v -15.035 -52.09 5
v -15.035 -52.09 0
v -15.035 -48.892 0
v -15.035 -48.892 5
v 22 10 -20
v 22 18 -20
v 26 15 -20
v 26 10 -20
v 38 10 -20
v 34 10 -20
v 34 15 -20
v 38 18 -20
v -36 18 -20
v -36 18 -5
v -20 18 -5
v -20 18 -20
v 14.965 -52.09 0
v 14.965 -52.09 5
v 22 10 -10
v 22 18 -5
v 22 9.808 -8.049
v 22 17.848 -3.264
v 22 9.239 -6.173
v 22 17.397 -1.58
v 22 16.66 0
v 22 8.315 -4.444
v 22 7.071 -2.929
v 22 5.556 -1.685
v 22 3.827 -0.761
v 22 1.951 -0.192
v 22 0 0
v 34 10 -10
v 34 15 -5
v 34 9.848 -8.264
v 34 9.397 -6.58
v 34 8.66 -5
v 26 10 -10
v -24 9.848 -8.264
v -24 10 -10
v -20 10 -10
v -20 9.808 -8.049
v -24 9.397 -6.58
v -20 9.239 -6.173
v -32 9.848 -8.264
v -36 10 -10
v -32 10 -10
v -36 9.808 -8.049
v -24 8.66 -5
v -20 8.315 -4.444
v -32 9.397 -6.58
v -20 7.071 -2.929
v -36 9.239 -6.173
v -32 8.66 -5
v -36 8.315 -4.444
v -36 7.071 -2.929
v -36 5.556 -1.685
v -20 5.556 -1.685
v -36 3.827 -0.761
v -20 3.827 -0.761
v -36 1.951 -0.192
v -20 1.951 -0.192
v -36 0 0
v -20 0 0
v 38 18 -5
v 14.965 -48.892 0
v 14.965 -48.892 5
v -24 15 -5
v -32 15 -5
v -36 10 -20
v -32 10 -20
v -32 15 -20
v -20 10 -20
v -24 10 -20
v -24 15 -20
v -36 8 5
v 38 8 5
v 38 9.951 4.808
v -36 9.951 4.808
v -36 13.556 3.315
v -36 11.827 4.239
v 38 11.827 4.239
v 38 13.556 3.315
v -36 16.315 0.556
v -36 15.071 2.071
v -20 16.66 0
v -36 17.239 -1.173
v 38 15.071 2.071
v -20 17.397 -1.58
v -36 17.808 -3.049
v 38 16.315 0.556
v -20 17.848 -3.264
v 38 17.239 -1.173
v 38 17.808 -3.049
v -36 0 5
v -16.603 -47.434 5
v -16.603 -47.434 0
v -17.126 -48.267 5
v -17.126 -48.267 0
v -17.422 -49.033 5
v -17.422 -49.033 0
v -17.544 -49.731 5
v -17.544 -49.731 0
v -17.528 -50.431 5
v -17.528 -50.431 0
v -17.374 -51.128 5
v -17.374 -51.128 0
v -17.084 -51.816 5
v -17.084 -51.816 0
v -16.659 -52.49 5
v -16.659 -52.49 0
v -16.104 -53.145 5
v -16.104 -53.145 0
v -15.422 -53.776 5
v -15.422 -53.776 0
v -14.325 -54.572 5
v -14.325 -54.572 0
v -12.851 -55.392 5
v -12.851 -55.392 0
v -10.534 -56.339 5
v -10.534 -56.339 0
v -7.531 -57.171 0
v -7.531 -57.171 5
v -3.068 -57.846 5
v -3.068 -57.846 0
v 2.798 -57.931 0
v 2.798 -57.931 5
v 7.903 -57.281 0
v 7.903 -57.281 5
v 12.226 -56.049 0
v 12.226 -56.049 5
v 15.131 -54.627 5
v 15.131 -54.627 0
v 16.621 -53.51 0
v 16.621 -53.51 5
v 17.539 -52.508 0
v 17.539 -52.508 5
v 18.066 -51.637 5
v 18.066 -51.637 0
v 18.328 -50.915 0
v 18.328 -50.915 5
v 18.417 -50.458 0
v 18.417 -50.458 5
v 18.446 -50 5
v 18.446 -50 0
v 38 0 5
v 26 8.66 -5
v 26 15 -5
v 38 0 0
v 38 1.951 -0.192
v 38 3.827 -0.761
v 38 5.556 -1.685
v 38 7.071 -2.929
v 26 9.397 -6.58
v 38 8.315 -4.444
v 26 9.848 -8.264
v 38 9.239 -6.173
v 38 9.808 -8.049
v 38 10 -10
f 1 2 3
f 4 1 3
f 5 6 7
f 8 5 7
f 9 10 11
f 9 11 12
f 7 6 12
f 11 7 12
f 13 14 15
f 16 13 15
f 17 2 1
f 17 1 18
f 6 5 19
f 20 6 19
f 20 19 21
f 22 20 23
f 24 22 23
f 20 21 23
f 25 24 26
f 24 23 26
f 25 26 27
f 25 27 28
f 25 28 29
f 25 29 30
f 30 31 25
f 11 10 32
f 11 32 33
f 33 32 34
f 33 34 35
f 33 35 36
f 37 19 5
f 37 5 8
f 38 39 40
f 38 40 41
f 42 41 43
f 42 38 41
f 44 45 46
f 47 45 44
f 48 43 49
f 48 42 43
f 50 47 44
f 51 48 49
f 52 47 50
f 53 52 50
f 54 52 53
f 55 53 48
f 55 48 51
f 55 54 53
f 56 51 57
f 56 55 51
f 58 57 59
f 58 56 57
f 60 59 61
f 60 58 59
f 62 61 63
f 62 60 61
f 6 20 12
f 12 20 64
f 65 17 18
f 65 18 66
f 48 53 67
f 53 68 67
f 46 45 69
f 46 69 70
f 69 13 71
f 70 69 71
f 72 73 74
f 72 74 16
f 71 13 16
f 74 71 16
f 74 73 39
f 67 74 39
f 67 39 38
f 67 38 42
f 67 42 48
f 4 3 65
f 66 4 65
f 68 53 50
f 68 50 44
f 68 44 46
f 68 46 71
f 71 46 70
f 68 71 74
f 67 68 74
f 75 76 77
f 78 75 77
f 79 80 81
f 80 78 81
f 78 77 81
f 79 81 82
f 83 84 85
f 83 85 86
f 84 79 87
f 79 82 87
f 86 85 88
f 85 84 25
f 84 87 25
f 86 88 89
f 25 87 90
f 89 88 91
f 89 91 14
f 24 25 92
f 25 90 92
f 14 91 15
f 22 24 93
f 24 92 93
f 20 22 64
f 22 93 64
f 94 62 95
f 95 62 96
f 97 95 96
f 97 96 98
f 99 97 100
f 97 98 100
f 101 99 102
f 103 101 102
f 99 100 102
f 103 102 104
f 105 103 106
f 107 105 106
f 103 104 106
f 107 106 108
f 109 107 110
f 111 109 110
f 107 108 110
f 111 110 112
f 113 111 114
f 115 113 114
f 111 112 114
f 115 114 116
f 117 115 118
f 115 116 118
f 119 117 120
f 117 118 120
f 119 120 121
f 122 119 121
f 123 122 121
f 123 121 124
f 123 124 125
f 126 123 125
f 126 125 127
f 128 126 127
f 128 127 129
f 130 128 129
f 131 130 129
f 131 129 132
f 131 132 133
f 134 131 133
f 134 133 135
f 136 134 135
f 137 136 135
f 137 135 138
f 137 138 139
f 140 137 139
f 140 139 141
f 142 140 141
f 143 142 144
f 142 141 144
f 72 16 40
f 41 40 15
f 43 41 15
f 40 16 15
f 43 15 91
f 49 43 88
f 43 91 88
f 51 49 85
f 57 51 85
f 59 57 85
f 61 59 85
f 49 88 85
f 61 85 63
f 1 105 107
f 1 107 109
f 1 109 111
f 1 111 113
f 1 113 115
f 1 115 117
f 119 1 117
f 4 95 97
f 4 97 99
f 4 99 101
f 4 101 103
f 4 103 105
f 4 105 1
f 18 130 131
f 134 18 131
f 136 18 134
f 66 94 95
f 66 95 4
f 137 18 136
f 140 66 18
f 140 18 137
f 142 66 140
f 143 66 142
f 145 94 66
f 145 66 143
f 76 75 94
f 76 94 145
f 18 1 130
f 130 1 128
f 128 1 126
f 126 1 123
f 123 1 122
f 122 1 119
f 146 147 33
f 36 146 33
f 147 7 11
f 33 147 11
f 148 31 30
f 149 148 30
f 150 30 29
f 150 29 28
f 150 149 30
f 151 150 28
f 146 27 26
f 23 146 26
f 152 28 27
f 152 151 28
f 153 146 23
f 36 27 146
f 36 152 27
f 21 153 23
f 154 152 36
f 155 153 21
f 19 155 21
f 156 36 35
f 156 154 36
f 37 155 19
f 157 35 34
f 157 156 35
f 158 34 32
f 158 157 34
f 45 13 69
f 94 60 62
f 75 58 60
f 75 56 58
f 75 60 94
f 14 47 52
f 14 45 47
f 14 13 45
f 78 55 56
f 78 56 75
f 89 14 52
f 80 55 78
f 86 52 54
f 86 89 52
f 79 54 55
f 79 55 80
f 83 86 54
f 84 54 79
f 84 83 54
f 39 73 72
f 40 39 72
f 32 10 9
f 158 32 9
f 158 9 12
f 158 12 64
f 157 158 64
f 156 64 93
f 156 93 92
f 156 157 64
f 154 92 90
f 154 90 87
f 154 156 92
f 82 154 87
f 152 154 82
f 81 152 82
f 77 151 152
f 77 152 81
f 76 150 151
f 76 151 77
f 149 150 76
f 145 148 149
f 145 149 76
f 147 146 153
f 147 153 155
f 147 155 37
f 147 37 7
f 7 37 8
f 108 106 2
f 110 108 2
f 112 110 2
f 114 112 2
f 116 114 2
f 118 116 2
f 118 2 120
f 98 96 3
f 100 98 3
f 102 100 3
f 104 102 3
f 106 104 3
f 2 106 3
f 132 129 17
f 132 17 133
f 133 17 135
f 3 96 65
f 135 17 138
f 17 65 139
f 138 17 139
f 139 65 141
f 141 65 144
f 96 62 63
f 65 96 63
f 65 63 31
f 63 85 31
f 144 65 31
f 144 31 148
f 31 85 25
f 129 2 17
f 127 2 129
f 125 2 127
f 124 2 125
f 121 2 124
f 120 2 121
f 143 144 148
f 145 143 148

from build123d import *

# Parameters (mm, degrees)
PLATE_FEATURE_DEPTH        = 5
STRAP_FEATURE_SKETCH_RX    = 18
STRAP_FEATURE_SKETCH_RY    = 8
STRAP_FEATURE_DEPTH        = 5
STRAP_CUT_SKETCH_W         = 30
STRAP_CUT_SKETCH_H         = 3.19824666
STRAP_CUT_DEPTH            = 5
LEFT_LEG_FEATURE_SKETCH_W  = 16
LEFT_LEG_FEATURE_SKETCH_H  = 8
LEFT_LEG_FEATURE_DEPTH     = 20
RIGHT_LEG_FEATURE_SKETCH_W = 16
RIGHT_LEG_FEATURE_SKETCH_H = 8
RIGHT_LEG_FEATURE_DEPTH    = 20
TAB_CUT_SKETCH_W           = 8
TAB_CUT_SKETCH_H           = 15
TAB_CUT_DEPTH              = 5
FILLET1_R                  = 10
FILLET2_R                  = 10
FILLET3_R                  = 10


with BuildPart() as part:
    # Plate Feature Sketch → Plate Feature (new body)
    with BuildSketch(Plane.XY):
        Polygon((-36, 18), (-36, 0), (-15.55368079, -50), (18.44631921, -50), (38, 0), (38, 18), align=None)
    extrude(amount=PLATE_FEATURE_DEPTH)

    # Strap Feature Sketch → Strap Feature (add)
    with BuildSketch(Plane.XY):
        with Locations((0.44631921, -50)):
            Ellipse(STRAP_FEATURE_SKETCH_RX, STRAP_FEATURE_SKETCH_RY)
    extrude(amount=STRAP_FEATURE_DEPTH)

    # Strap Cut Sketch → Strap Cut (cut)
    with BuildSketch(Plane.XY):
        with Locations((-0.034918838, -50.490814337)):
            Rectangle(STRAP_CUT_SKETCH_W, STRAP_CUT_SKETCH_H)
    extrude(amount=STRAP_CUT_DEPTH, mode=Mode.SUBTRACT)

    # Left Leg Feature Sketch → Left Leg Feature (add)
    with BuildSketch(Plane.XY):
        with Locations((30, 14)):
            Rectangle(LEFT_LEG_FEATURE_SKETCH_W, LEFT_LEG_FEATURE_SKETCH_H)
    extrude(amount=-LEFT_LEG_FEATURE_DEPTH)

    # Right Leg Feature Sketch → Right Leg Feature (add)
    with BuildSketch(Plane.XY):
        with Locations((-28, 14)):
            Rectangle(RIGHT_LEG_FEATURE_SKETCH_W, RIGHT_LEG_FEATURE_SKETCH_H)
    extrude(amount=-RIGHT_LEG_FEATURE_DEPTH)

    # Tab Cut Sketch → Tab Cut (cut)
    with BuildSketch(Plane(origin=(0, 10, 0), x_dir=(1, 0, 0), z_dir=(0, 1, 0))):
        with Locations((-28, 12.5)):
            Rectangle(TAB_CUT_SKETCH_W, TAB_CUT_SKETCH_H)
        with Locations((30, 12.5)):
            Rectangle(TAB_CUT_SKETCH_W, TAB_CUT_SKETCH_H)
    extrude(amount=TAB_CUT_DEPTH, mode=Mode.SUBTRACT)

    # Fillet1
    # the kernel refuses this fillet: 10 mm, written as the material it takes off along each edge
    with BuildSketch(Plane(origin=(63, 18, 5), x_dir=(0, 0, -1), z_dir=(-1, 0, 0))) as fillet1_piece_1:
        with BuildLine():
            CenterArc((FILLET1_R, FILLET1_R), FILLET1_R, 180, 90)
            Line((0, FILLET1_R), (0, 0))
            Line((0, 0), (FILLET1_R, 0))
        make_face()
    extrude(amount=124, mode=Mode.SUBTRACT)

    # Fillet2
    # the kernel refuses this fillet: 10 mm, written as the material it adds along each edge
    with BuildSketch(Plane(origin=(-36, 10, 0), x_dir=(0, 0, -1), z_dir=(1, 0, 0))) as fillet2_piece_1_section:
        with BuildLine():
            CenterArc((FILLET2_R, -FILLET2_R), FILLET2_R, 90, 90)
            Line((0, -FILLET2_R), (0, 0))
            Line((0, 0), (FILLET2_R, 0))
        make_face()
    fillet2_piece_1 = extrude(amount=16, mode=Mode.PRIVATE)
    fillet2_piece_1 = split(fillet2_piece_1, bisect_by=Plane(origin=(-34, 9.759916183, -5), z_dir=(0, 0, -1)), keep=Keep.TOP, mode=Mode.PRIVATE)
    fillet2_piece_1 = split(fillet2_piece_1, bisect_by=Plane(origin=(-32, 9.759916183, -6.632507845), z_dir=(-1, 0, 0)), keep=Keep.TOP, mode=Mode.PRIVATE)
    add(fillet2_piece_1)
    with BuildSketch(Plane(origin=(-36, 10, 0), x_dir=(0, 0, -1), z_dir=(1, 0, 0))) as fillet2_piece_2_section:
        with BuildLine():
            CenterArc((FILLET2_R, -FILLET2_R), FILLET2_R, 90, 90)
            Line((0, -FILLET2_R), (0, 0))
            Line((0, 0), (FILLET2_R, 0))
        make_face()
    fillet2_piece_2 = extrude(amount=16, mode=Mode.PRIVATE)
    fillet2_piece_2 = split(fillet2_piece_2, bisect_by=Plane(origin=(-34, 7.4487994, -5), z_dir=(0, 0, 1)), keep=Keep.TOP, mode=Mode.PRIVATE)
    fillet2_piece_2 = split(fillet2_piece_2, bisect_by=Plane(origin=(-32, 7.4487994, -1.643917643), z_dir=(-1, 0, 0)), keep=Keep.TOP, mode=Mode.PRIVATE)
    add(fillet2_piece_2)
    with BuildSketch(Plane(origin=(-36, 10, 0), x_dir=(0, 0, -1), z_dir=(1, 0, 0))) as fillet2_piece_3_section:
        with BuildLine():
            CenterArc((FILLET2_R, -FILLET2_R), FILLET2_R, 90, 90)
            Line((0, -FILLET2_R), (0, 0))
            Line((0, 0), (FILLET2_R, 0))
        make_face()
    fillet2_piece_3 = extrude(amount=16, mode=Mode.PRIVATE)
    fillet2_piece_3 = split(fillet2_piece_3, bisect_by=Plane(origin=(-24, 7.4487994, -1.643917643), z_dir=(-1, 0, 0)), keep=Keep.TOP, mode=Mode.PRIVATE)
    fillet2_piece_3 = split(fillet2_piece_3, bisect_by=Plane(origin=(-28, 7.4487994, -5), z_dir=(0, 0, 1)), keep=Keep.TOP, mode=Mode.PRIVATE)
    fillet2_piece_3 = split(fillet2_piece_3, bisect_by=Plane(origin=(-32, 7.4487994, -1.643917643), z_dir=(1, 0, 0)), keep=Keep.TOP, mode=Mode.PRIVATE)
    add(fillet2_piece_3)
    with BuildSketch(Plane(origin=(-36, 10, 0), x_dir=(0, 0, -1), z_dir=(1, 0, 0))) as fillet2_piece_4_section:
        with BuildLine():
            CenterArc((FILLET2_R, -FILLET2_R), FILLET2_R, 90, 90)
            Line((0, -FILLET2_R), (0, 0))
            Line((0, 0), (FILLET2_R, 0))
        make_face()
    fillet2_piece_4 = extrude(amount=16, mode=Mode.PRIVATE)
    fillet2_piece_4 = split(fillet2_piece_4, bisect_by=Plane(origin=(-24, 9.759916183, -6.632507845), z_dir=(1, 0, 0)), keep=Keep.TOP, mode=Mode.PRIVATE)
    fillet2_piece_4 = split(fillet2_piece_4, bisect_by=Plane(origin=(-22, 9.759916183, -5), z_dir=(0, 0, -1)), keep=Keep.TOP, mode=Mode.PRIVATE)
    add(fillet2_piece_4)
    with BuildSketch(Plane(origin=(-36, 10, 0), x_dir=(0, 0, -1), z_dir=(1, 0, 0))) as fillet2_piece_5_section:
        with BuildLine():
            CenterArc((FILLET2_R, -FILLET2_R), FILLET2_R, 90, 90)
            Line((0, -FILLET2_R), (0, 0))
            Line((0, 0), (FILLET2_R, 0))
        make_face()
    fillet2_piece_5 = extrude(amount=16, mode=Mode.PRIVATE)
    fillet2_piece_5 = split(fillet2_piece_5, bisect_by=Plane(origin=(-24, 7.4487994, -1.643917643), z_dir=(1, 0, 0)), keep=Keep.TOP, mode=Mode.PRIVATE)
    fillet2_piece_5 = split(fillet2_piece_5, bisect_by=Plane(origin=(-22, 7.4487994, -5), z_dir=(0, 0, 1)), keep=Keep.TOP, mode=Mode.PRIVATE)
    add(fillet2_piece_5)

    # Fillet3
    # the kernel refuses this fillet: 10 mm, written as the material it adds along each edge
    with BuildSketch(Plane(origin=(38, 10, 0), x_dir=(0, 0, -1), z_dir=(-1, 0, 0))) as fillet3_piece_1_section:
        with BuildLine():
            CenterArc((FILLET3_R, FILLET3_R), FILLET3_R, 180, 90)
            Line((0, FILLET3_R), (0, 0))
            Line((0, 0), (FILLET3_R, 0))
        make_face()
    fillet3_piece_1 = extrude(amount=16, mode=Mode.PRIVATE)
    fillet3_piece_1 = split(fillet3_piece_1, bisect_by=Plane(origin=(36, 9.759916183, -5), z_dir=(0, 0, -1)), keep=Keep.TOP, mode=Mode.PRIVATE)
    fillet3_piece_1 = split(fillet3_piece_1, bisect_by=Plane(origin=(34, 9.759916183, -6.632507845), z_dir=(1, 0, 0)), keep=Keep.TOP, mode=Mode.PRIVATE)
    add(fillet3_piece_1)
    with BuildSketch(Plane(origin=(38, 10, 0), x_dir=(0, 0, -1), z_dir=(-1, 0, 0))) as fillet3_piece_2_section:
        with BuildLine():
            CenterArc((FILLET3_R, FILLET3_R), FILLET3_R, 180, 90)
            Line((0, FILLET3_R), (0, 0))
            Line((0, 0), (FILLET3_R, 0))
        make_face()
    fillet3_piece_2 = extrude(amount=16, mode=Mode.PRIVATE)
    fillet3_piece_2 = split(fillet3_piece_2, bisect_by=Plane(origin=(36, 7.4487994, -5), z_dir=(0, 0, 1)), keep=Keep.TOP, mode=Mode.PRIVATE)
    fillet3_piece_2 = split(fillet3_piece_2, bisect_by=Plane(origin=(34, 7.4487994, -1.643917643), z_dir=(1, 0, 0)), keep=Keep.TOP, mode=Mode.PRIVATE)
    add(fillet3_piece_2)
    with BuildSketch(Plane(origin=(38, 10, 0), x_dir=(0, 0, -1), z_dir=(-1, 0, 0))) as fillet3_piece_3_section:
        with BuildLine():
            CenterArc((FILLET3_R, FILLET3_R), FILLET3_R, 180, 90)
            Line((0, FILLET3_R), (0, 0))
            Line((0, 0), (FILLET3_R, 0))
        make_face()
    fillet3_piece_3 = extrude(amount=16, mode=Mode.PRIVATE)
    fillet3_piece_3 = split(fillet3_piece_3, bisect_by=Plane(origin=(26, 7.4487994, -1.643917643), z_dir=(1, 0, 0)), keep=Keep.TOP, mode=Mode.PRIVATE)
    fillet3_piece_3 = split(fillet3_piece_3, bisect_by=Plane(origin=(30, 7.4487994, -5), z_dir=(0, 0, 1)), keep=Keep.TOP, mode=Mode.PRIVATE)
    fillet3_piece_3 = split(fillet3_piece_3, bisect_by=Plane(origin=(34, 7.4487994, -1.643917643), z_dir=(-1, 0, 0)), keep=Keep.TOP, mode=Mode.PRIVATE)
    add(fillet3_piece_3)
    with BuildSketch(Plane(origin=(38, 10, 0), x_dir=(0, 0, -1), z_dir=(-1, 0, 0))) as fillet3_piece_4_section:
        with BuildLine():
            CenterArc((FILLET3_R, FILLET3_R), FILLET3_R, 180, 90)
            Line((0, FILLET3_R), (0, 0))
            Line((0, 0), (FILLET3_R, 0))
        make_face()
    fillet3_piece_4 = extrude(amount=16, mode=Mode.PRIVATE)
    fillet3_piece_4 = split(fillet3_piece_4, bisect_by=Plane(origin=(26, 9.759916183, -6.632507845), z_dir=(-1, 0, 0)), keep=Keep.TOP, mode=Mode.PRIVATE)
    fillet3_piece_4 = split(fillet3_piece_4, bisect_by=Plane(origin=(24, 9.759916183, -5), z_dir=(0, 0, -1)), keep=Keep.TOP, mode=Mode.PRIVATE)
    add(fillet3_piece_4)
    with BuildSketch(Plane(origin=(38, 10, 0), x_dir=(0, 0, -1), z_dir=(-1, 0, 0))) as fillet3_piece_5_section:
        with BuildLine():
            CenterArc((FILLET3_R, FILLET3_R), FILLET3_R, 180, 90)
            Line((0, FILLET3_R), (0, 0))
            Line((0, 0), (FILLET3_R, 0))
        make_face()
    fillet3_piece_5 = extrude(amount=16, mode=Mode.PRIVATE)
    fillet3_piece_5 = split(fillet3_piece_5, bisect_by=Plane(origin=(26, 7.4487994, -1.643917643), z_dir=(-1, 0, 0)), keep=Keep.TOP, mode=Mode.PRIVATE)
    fillet3_piece_5 = split(fillet3_piece_5, bisect_by=Plane(origin=(24, 7.4487994, -5), z_dir=(0, 0, 1)), keep=Keep.TOP, mode=Mode.PRIVATE)
    add(fillet3_piece_5)


solid = part.part
